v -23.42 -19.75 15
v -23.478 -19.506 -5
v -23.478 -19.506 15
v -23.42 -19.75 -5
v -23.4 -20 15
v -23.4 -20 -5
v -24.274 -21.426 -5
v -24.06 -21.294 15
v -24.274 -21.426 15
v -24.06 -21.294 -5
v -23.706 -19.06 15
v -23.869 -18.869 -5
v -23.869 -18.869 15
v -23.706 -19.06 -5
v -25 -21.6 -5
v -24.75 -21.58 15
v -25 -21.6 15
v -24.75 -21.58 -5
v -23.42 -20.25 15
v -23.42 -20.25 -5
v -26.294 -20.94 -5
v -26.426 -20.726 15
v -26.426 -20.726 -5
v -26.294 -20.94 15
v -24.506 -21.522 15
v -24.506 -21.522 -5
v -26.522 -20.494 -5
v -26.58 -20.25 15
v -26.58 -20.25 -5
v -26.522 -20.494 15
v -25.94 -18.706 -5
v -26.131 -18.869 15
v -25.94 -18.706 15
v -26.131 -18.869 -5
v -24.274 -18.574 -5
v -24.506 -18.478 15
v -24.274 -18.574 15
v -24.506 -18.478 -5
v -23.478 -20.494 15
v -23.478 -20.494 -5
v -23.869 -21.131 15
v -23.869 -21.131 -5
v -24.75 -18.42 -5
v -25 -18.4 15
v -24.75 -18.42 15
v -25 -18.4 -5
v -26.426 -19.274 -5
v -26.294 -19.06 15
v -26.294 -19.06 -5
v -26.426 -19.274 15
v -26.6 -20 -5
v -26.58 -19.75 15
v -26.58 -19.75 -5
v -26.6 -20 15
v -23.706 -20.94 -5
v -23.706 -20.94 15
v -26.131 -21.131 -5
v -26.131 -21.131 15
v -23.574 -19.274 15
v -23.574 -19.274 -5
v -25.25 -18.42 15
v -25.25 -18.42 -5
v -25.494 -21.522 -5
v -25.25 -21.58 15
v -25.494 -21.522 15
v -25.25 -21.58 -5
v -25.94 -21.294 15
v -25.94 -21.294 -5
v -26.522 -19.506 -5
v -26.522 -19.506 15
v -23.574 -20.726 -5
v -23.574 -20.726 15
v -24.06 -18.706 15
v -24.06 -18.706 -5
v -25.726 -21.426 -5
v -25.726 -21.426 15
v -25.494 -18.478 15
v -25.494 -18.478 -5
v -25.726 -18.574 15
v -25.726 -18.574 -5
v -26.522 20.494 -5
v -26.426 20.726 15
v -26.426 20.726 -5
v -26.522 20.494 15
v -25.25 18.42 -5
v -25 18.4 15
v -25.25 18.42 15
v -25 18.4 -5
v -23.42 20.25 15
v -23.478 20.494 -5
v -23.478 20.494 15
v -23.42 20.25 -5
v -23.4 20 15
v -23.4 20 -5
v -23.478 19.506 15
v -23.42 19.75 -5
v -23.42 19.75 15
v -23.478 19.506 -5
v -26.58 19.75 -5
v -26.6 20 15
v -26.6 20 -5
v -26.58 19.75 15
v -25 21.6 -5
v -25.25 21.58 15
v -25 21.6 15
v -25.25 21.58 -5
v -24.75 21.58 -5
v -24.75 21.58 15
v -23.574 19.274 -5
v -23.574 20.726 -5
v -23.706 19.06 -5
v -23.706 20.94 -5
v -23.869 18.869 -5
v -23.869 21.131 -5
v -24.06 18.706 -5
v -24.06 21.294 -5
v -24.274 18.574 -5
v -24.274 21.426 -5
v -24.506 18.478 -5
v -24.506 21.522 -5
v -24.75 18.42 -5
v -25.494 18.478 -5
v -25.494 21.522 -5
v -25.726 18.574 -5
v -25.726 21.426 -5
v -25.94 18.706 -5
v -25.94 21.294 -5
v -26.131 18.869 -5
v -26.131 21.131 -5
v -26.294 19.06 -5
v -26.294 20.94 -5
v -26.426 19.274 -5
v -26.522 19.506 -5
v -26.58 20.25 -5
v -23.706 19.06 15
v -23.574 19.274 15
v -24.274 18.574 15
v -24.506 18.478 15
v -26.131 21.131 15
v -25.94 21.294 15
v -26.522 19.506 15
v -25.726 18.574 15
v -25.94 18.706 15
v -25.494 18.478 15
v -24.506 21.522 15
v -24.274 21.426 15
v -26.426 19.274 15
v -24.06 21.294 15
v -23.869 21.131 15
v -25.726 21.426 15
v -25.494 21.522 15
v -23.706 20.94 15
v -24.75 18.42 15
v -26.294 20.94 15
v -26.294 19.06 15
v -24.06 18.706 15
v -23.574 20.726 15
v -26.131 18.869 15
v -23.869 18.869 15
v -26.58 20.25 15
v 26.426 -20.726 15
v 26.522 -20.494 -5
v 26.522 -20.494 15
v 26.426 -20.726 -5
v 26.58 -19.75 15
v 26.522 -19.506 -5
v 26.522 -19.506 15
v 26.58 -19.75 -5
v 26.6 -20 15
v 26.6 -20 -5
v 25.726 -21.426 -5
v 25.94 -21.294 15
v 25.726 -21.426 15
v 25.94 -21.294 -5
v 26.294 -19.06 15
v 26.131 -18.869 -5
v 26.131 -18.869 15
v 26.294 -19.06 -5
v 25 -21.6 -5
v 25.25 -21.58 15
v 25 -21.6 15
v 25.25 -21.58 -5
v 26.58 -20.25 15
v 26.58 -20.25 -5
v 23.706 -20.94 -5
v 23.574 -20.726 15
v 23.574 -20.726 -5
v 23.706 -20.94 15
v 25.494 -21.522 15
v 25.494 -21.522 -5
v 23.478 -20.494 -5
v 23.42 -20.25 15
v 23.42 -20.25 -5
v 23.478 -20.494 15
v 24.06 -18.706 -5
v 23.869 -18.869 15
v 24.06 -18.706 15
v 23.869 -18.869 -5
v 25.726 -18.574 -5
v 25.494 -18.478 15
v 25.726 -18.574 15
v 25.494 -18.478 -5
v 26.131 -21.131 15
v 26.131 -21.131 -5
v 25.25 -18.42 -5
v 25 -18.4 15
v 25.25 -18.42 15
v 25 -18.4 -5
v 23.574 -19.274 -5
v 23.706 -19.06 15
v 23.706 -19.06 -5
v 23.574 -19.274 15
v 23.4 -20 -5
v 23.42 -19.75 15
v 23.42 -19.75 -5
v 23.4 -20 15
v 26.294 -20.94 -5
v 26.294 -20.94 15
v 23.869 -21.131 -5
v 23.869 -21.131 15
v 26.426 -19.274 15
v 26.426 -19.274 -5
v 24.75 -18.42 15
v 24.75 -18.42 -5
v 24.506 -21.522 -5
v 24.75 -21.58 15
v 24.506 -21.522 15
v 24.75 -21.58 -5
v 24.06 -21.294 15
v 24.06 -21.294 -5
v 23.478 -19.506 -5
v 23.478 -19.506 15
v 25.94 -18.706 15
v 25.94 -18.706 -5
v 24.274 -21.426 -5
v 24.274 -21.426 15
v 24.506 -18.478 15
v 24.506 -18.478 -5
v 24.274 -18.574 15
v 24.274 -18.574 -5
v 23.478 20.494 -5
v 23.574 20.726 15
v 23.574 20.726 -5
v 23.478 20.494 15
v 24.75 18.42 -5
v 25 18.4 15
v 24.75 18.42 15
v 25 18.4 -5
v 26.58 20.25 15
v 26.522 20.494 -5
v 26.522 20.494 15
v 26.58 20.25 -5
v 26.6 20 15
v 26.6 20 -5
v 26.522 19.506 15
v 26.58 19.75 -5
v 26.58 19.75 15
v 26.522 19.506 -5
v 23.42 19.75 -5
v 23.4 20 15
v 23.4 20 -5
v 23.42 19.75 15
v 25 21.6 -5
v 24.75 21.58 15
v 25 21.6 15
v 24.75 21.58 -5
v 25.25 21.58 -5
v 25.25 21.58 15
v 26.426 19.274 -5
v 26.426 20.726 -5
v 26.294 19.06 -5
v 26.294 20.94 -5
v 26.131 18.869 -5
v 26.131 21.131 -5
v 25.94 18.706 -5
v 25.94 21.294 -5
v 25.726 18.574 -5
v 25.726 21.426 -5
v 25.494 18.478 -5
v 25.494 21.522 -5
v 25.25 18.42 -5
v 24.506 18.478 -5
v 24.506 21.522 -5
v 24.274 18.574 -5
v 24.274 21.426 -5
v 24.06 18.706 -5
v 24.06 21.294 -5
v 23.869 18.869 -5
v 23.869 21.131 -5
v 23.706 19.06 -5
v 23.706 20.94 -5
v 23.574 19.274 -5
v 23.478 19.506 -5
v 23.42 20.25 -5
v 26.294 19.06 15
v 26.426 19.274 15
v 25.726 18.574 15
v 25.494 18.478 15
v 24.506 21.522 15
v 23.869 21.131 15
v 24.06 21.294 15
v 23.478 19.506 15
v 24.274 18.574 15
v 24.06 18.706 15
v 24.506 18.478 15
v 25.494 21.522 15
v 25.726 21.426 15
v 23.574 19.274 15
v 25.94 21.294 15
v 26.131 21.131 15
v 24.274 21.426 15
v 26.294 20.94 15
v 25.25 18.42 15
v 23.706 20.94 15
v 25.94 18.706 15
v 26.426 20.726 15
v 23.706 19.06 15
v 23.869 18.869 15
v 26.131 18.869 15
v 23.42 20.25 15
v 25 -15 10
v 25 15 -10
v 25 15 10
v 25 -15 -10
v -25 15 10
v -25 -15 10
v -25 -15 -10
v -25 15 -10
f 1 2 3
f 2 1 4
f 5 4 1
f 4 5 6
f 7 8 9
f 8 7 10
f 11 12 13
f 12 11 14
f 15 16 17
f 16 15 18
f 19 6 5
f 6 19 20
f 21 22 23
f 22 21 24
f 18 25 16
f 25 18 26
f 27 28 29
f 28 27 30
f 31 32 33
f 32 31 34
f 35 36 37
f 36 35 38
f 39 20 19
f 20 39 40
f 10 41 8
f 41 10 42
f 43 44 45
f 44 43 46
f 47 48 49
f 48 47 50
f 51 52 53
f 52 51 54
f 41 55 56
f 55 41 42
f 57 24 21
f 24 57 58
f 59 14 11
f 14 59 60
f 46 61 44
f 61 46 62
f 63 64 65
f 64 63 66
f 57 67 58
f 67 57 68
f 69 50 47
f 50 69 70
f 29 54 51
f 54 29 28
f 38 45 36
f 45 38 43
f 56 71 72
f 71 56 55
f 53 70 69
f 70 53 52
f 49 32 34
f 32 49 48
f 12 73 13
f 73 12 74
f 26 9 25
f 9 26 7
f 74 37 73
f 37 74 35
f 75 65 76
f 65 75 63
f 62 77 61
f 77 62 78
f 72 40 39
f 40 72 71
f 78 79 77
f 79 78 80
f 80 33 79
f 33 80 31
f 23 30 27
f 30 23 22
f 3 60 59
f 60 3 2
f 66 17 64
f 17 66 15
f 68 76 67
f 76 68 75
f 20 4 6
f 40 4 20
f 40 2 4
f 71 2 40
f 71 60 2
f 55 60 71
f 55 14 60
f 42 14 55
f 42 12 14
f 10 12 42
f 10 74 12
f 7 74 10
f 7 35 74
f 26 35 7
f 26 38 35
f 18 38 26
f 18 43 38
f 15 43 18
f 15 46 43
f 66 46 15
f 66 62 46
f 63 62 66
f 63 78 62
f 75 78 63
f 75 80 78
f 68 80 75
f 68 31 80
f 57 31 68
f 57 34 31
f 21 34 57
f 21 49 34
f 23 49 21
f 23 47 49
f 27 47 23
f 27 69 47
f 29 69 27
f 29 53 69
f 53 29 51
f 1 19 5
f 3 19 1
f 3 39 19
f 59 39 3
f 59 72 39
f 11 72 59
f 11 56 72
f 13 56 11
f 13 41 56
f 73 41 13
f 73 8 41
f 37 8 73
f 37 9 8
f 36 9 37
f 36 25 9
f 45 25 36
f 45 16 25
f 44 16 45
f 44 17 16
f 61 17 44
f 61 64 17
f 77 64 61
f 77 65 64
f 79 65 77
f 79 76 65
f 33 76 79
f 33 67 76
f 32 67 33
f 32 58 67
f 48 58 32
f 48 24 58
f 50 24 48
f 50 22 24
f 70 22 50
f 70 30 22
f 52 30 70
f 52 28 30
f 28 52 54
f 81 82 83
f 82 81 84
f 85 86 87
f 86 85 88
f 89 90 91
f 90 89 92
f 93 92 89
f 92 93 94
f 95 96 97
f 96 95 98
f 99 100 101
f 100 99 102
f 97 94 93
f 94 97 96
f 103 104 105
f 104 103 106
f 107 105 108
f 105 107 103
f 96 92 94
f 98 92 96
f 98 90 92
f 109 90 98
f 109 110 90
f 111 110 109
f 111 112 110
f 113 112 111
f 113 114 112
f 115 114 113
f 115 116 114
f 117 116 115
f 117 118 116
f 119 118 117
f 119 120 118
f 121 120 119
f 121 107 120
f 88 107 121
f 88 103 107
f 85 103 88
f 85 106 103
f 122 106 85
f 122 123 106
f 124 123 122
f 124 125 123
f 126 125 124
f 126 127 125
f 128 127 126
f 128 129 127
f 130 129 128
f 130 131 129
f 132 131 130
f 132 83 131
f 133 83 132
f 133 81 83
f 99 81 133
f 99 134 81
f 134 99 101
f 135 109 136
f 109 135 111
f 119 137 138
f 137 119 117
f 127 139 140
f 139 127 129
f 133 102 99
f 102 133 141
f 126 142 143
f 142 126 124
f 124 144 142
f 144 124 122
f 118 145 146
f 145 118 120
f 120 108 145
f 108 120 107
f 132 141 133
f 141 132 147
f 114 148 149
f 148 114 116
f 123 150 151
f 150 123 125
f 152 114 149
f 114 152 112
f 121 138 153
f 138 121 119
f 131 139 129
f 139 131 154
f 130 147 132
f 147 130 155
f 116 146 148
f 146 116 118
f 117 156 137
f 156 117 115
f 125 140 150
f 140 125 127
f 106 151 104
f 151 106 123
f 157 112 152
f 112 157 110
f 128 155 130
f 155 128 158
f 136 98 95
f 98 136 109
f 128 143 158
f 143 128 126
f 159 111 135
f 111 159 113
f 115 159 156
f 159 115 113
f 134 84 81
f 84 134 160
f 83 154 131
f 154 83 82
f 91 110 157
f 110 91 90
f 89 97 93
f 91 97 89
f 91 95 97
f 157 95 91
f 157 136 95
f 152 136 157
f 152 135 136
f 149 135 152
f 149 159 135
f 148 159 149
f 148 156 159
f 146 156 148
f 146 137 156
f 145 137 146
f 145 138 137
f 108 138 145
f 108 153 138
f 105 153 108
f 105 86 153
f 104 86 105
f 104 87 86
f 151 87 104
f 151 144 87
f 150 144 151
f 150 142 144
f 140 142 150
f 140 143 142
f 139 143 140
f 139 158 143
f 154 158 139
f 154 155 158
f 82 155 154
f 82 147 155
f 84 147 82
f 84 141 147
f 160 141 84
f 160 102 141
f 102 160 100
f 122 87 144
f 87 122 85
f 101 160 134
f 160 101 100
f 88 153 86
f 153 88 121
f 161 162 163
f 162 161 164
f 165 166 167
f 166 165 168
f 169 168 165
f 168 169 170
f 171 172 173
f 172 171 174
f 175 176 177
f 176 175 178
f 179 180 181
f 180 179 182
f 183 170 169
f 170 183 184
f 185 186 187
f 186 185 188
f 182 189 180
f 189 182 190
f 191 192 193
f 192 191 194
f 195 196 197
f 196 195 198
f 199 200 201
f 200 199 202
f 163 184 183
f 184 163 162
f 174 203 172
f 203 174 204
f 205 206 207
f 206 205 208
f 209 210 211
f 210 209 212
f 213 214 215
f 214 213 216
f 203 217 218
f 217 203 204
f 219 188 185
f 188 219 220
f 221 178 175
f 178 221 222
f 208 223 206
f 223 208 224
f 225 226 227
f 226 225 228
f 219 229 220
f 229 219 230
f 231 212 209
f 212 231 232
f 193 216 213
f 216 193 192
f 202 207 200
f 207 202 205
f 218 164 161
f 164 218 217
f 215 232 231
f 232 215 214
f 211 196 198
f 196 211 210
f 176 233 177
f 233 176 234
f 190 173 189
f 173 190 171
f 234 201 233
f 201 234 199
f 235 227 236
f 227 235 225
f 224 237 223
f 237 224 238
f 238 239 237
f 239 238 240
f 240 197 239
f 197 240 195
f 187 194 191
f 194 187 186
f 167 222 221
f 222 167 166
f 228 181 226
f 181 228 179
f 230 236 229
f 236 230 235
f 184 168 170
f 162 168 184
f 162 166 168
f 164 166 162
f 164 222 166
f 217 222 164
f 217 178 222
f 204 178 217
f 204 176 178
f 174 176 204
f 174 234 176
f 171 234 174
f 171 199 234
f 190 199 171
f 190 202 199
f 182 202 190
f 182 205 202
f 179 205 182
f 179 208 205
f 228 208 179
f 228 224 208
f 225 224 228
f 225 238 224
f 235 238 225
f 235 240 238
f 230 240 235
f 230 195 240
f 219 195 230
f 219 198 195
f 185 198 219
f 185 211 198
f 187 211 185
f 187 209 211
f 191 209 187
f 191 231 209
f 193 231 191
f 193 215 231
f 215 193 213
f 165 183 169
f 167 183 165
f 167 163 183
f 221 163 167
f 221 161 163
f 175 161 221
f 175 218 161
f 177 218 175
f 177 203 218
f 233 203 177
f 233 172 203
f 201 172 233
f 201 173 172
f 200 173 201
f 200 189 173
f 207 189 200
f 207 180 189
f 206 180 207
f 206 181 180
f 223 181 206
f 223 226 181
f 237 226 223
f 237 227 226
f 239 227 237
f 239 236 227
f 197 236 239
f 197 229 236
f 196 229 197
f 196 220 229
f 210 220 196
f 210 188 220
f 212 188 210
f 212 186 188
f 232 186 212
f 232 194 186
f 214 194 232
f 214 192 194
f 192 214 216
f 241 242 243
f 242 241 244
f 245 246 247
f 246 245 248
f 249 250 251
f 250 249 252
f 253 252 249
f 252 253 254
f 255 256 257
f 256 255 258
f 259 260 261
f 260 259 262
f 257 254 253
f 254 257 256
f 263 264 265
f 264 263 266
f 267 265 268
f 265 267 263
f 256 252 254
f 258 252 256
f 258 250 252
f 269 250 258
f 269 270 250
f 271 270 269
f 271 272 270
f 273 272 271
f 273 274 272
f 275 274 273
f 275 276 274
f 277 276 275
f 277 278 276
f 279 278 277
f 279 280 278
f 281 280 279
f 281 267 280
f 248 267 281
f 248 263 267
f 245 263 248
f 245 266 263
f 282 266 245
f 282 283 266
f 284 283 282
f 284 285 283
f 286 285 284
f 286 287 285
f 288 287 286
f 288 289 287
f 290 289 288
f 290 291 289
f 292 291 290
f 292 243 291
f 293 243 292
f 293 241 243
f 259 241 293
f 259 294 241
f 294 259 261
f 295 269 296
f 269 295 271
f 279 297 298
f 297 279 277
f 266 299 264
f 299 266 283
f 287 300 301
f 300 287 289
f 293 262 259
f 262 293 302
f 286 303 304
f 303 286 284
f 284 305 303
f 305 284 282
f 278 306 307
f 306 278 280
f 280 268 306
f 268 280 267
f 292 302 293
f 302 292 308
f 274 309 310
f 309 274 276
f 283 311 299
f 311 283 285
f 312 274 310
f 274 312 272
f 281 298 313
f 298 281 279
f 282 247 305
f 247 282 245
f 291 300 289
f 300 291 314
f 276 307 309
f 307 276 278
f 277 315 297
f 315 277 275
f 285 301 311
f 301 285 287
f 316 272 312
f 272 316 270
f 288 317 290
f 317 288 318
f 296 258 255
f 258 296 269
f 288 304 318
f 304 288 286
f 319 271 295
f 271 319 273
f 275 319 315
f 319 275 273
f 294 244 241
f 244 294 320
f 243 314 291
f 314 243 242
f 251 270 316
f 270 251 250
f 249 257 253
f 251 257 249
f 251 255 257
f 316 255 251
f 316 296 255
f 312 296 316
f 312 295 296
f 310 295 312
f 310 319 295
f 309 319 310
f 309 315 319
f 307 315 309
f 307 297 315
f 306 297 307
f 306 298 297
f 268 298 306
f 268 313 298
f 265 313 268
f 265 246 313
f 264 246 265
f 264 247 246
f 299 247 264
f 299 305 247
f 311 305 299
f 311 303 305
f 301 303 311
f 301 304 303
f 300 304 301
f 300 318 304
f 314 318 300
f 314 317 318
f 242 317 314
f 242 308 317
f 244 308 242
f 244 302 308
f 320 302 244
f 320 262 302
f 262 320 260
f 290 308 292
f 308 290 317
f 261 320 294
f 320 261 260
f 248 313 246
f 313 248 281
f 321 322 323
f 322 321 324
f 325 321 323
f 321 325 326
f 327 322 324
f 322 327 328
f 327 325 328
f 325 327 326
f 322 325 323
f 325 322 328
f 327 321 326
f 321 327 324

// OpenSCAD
module AdOnBoreHoles() {
    for (x = [-50.0/2, 50.0/2])
        for (y = [-30/2-5, 30/2+5])
            translate([x, y, 0])        
                children();
}


module AdOn() {
    /*
    color("red") {

        translate([-70.7/2, -23.8/2, 7-11])
        cube([90, 35, 11]);

        difference() {

            translate([-80/2, -36/2, -1.6])
            cube([100, 47.2, 1.6]);
            
            AdOnBoreHoles()
            translate([0, 0, -5])        
                cylinder($fn=20, d = 2.8, h = 10);
        }

        translate([-13, -2, 7-11-9])
        cube([55, 20, 9]);
        
    }
    */
};


module AdOnCutout(clearence = 0.2) {
    translate([-50.0/2, -30.0/2, -10])
        cube([50, 30, 20]);

    AdOnBoreHoles()
    translate([0, 0, -5])        
            cylinder($fn=40, d = 2.8 + clearence*2, h = 20);
};

AdOn();
AdOnCutout();
